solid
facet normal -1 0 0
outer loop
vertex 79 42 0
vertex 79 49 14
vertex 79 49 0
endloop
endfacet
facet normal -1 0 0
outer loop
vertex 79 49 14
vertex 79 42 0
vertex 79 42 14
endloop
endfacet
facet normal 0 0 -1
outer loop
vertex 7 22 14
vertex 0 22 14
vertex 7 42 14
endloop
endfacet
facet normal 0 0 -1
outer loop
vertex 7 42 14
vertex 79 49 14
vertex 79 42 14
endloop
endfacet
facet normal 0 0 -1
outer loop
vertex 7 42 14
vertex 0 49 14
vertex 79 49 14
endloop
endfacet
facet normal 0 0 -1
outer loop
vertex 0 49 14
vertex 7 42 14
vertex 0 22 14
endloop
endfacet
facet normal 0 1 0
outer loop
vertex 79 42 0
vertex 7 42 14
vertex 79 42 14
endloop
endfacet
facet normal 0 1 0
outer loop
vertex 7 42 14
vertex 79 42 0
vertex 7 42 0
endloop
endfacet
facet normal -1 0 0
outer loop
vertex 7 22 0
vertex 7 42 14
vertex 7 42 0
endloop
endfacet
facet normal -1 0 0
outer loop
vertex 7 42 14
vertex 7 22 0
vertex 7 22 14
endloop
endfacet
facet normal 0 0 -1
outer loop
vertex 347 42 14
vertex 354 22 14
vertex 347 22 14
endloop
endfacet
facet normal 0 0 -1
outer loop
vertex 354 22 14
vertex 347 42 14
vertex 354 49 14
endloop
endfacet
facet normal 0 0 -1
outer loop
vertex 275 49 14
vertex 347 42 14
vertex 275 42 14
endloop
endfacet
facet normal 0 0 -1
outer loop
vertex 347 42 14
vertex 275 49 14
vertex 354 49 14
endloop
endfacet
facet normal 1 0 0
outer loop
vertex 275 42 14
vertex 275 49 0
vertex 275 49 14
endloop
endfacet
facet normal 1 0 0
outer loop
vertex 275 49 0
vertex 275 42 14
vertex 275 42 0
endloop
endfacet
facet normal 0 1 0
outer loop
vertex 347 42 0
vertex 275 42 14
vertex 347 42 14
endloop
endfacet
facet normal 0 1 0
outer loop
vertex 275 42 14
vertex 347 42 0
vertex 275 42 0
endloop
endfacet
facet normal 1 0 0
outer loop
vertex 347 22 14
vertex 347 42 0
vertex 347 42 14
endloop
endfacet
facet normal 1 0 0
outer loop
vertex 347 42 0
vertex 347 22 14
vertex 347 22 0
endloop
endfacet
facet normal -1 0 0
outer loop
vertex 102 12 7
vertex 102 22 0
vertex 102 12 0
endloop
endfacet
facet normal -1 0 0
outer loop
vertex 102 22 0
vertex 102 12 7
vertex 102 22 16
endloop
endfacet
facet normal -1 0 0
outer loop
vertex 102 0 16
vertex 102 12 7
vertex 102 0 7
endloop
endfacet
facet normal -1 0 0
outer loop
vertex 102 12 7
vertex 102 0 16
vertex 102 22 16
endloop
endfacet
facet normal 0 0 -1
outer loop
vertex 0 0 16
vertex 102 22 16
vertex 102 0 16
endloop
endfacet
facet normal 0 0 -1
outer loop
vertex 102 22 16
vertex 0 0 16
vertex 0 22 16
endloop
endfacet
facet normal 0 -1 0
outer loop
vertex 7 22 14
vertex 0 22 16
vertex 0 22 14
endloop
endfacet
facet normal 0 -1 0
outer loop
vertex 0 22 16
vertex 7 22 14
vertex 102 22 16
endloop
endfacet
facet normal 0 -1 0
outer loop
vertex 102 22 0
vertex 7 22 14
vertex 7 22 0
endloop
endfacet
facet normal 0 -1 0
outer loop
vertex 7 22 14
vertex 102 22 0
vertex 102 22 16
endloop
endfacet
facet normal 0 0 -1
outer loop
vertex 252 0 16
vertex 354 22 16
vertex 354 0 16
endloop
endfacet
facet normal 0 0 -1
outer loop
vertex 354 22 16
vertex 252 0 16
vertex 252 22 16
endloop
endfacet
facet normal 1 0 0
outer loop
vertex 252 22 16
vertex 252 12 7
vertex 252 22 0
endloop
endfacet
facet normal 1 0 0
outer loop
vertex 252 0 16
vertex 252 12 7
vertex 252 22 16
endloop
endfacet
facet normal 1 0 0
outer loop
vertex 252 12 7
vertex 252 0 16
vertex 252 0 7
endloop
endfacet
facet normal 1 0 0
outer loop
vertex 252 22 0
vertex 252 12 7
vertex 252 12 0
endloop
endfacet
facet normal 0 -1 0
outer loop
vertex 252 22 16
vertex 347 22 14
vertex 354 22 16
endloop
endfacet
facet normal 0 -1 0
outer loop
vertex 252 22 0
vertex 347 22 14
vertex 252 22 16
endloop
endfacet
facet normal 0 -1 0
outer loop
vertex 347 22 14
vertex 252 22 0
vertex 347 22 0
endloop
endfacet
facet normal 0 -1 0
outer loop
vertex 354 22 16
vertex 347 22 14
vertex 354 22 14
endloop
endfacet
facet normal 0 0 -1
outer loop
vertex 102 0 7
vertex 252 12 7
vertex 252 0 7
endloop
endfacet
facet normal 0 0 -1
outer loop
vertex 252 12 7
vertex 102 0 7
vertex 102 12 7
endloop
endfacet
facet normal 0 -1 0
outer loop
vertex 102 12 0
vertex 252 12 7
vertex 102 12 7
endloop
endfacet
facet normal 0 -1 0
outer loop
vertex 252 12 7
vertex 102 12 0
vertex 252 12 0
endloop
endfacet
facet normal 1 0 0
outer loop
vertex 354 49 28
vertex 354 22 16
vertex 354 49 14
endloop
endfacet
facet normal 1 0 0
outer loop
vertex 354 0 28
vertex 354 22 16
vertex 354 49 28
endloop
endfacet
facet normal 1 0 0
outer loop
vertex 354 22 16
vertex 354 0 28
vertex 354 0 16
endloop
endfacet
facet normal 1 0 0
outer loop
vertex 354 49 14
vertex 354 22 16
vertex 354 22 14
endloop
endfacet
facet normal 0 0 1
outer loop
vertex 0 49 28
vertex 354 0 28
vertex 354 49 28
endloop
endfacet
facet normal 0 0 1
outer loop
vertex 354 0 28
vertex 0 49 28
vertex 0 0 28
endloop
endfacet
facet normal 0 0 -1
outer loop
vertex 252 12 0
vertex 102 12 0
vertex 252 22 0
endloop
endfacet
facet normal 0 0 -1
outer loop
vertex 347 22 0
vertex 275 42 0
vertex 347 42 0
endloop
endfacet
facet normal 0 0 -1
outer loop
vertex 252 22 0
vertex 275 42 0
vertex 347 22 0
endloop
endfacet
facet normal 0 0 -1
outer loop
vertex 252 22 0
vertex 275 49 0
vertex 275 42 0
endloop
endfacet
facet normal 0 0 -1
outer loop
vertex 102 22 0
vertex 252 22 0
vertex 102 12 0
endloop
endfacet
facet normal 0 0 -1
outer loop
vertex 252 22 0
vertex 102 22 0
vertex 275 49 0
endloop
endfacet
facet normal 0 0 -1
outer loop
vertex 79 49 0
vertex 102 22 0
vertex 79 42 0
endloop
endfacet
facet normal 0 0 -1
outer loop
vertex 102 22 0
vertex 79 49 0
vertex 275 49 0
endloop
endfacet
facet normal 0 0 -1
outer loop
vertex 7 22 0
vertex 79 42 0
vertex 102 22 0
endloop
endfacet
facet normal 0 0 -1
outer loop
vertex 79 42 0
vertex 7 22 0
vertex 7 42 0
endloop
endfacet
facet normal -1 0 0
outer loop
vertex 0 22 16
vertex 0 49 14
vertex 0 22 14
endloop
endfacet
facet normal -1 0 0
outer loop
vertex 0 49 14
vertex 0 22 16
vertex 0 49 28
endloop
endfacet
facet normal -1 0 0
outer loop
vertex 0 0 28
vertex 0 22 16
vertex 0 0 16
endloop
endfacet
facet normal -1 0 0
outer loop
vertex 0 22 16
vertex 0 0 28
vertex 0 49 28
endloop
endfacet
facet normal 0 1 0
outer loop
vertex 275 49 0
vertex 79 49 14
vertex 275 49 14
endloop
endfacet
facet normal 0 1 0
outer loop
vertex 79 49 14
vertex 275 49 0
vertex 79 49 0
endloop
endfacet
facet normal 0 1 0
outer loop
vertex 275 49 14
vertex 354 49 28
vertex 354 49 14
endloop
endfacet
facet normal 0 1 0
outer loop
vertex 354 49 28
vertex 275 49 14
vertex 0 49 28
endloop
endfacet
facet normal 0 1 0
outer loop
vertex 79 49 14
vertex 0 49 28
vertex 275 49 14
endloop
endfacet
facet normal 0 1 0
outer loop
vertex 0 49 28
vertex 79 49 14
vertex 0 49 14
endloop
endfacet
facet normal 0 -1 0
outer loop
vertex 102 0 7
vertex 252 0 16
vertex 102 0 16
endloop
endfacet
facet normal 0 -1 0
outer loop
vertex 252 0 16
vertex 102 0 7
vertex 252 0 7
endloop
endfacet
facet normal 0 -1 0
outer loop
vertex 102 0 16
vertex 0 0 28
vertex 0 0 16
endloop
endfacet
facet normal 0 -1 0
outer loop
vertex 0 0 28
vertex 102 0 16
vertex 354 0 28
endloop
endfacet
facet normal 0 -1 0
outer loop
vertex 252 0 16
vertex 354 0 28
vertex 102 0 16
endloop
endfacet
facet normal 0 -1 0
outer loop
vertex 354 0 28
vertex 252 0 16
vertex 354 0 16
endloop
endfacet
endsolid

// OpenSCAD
include <../src/wardrobe.scad>;
plank_xy_bottom(wardrobe_n);
//github_openscad -o wardrobe_2/plank_xy_bottom.stl -D wardrobe_n=2 -D cutting_edge=0 -D break_view_length=0 wardrobe_2/plank_xy_bottom_stl.scad
